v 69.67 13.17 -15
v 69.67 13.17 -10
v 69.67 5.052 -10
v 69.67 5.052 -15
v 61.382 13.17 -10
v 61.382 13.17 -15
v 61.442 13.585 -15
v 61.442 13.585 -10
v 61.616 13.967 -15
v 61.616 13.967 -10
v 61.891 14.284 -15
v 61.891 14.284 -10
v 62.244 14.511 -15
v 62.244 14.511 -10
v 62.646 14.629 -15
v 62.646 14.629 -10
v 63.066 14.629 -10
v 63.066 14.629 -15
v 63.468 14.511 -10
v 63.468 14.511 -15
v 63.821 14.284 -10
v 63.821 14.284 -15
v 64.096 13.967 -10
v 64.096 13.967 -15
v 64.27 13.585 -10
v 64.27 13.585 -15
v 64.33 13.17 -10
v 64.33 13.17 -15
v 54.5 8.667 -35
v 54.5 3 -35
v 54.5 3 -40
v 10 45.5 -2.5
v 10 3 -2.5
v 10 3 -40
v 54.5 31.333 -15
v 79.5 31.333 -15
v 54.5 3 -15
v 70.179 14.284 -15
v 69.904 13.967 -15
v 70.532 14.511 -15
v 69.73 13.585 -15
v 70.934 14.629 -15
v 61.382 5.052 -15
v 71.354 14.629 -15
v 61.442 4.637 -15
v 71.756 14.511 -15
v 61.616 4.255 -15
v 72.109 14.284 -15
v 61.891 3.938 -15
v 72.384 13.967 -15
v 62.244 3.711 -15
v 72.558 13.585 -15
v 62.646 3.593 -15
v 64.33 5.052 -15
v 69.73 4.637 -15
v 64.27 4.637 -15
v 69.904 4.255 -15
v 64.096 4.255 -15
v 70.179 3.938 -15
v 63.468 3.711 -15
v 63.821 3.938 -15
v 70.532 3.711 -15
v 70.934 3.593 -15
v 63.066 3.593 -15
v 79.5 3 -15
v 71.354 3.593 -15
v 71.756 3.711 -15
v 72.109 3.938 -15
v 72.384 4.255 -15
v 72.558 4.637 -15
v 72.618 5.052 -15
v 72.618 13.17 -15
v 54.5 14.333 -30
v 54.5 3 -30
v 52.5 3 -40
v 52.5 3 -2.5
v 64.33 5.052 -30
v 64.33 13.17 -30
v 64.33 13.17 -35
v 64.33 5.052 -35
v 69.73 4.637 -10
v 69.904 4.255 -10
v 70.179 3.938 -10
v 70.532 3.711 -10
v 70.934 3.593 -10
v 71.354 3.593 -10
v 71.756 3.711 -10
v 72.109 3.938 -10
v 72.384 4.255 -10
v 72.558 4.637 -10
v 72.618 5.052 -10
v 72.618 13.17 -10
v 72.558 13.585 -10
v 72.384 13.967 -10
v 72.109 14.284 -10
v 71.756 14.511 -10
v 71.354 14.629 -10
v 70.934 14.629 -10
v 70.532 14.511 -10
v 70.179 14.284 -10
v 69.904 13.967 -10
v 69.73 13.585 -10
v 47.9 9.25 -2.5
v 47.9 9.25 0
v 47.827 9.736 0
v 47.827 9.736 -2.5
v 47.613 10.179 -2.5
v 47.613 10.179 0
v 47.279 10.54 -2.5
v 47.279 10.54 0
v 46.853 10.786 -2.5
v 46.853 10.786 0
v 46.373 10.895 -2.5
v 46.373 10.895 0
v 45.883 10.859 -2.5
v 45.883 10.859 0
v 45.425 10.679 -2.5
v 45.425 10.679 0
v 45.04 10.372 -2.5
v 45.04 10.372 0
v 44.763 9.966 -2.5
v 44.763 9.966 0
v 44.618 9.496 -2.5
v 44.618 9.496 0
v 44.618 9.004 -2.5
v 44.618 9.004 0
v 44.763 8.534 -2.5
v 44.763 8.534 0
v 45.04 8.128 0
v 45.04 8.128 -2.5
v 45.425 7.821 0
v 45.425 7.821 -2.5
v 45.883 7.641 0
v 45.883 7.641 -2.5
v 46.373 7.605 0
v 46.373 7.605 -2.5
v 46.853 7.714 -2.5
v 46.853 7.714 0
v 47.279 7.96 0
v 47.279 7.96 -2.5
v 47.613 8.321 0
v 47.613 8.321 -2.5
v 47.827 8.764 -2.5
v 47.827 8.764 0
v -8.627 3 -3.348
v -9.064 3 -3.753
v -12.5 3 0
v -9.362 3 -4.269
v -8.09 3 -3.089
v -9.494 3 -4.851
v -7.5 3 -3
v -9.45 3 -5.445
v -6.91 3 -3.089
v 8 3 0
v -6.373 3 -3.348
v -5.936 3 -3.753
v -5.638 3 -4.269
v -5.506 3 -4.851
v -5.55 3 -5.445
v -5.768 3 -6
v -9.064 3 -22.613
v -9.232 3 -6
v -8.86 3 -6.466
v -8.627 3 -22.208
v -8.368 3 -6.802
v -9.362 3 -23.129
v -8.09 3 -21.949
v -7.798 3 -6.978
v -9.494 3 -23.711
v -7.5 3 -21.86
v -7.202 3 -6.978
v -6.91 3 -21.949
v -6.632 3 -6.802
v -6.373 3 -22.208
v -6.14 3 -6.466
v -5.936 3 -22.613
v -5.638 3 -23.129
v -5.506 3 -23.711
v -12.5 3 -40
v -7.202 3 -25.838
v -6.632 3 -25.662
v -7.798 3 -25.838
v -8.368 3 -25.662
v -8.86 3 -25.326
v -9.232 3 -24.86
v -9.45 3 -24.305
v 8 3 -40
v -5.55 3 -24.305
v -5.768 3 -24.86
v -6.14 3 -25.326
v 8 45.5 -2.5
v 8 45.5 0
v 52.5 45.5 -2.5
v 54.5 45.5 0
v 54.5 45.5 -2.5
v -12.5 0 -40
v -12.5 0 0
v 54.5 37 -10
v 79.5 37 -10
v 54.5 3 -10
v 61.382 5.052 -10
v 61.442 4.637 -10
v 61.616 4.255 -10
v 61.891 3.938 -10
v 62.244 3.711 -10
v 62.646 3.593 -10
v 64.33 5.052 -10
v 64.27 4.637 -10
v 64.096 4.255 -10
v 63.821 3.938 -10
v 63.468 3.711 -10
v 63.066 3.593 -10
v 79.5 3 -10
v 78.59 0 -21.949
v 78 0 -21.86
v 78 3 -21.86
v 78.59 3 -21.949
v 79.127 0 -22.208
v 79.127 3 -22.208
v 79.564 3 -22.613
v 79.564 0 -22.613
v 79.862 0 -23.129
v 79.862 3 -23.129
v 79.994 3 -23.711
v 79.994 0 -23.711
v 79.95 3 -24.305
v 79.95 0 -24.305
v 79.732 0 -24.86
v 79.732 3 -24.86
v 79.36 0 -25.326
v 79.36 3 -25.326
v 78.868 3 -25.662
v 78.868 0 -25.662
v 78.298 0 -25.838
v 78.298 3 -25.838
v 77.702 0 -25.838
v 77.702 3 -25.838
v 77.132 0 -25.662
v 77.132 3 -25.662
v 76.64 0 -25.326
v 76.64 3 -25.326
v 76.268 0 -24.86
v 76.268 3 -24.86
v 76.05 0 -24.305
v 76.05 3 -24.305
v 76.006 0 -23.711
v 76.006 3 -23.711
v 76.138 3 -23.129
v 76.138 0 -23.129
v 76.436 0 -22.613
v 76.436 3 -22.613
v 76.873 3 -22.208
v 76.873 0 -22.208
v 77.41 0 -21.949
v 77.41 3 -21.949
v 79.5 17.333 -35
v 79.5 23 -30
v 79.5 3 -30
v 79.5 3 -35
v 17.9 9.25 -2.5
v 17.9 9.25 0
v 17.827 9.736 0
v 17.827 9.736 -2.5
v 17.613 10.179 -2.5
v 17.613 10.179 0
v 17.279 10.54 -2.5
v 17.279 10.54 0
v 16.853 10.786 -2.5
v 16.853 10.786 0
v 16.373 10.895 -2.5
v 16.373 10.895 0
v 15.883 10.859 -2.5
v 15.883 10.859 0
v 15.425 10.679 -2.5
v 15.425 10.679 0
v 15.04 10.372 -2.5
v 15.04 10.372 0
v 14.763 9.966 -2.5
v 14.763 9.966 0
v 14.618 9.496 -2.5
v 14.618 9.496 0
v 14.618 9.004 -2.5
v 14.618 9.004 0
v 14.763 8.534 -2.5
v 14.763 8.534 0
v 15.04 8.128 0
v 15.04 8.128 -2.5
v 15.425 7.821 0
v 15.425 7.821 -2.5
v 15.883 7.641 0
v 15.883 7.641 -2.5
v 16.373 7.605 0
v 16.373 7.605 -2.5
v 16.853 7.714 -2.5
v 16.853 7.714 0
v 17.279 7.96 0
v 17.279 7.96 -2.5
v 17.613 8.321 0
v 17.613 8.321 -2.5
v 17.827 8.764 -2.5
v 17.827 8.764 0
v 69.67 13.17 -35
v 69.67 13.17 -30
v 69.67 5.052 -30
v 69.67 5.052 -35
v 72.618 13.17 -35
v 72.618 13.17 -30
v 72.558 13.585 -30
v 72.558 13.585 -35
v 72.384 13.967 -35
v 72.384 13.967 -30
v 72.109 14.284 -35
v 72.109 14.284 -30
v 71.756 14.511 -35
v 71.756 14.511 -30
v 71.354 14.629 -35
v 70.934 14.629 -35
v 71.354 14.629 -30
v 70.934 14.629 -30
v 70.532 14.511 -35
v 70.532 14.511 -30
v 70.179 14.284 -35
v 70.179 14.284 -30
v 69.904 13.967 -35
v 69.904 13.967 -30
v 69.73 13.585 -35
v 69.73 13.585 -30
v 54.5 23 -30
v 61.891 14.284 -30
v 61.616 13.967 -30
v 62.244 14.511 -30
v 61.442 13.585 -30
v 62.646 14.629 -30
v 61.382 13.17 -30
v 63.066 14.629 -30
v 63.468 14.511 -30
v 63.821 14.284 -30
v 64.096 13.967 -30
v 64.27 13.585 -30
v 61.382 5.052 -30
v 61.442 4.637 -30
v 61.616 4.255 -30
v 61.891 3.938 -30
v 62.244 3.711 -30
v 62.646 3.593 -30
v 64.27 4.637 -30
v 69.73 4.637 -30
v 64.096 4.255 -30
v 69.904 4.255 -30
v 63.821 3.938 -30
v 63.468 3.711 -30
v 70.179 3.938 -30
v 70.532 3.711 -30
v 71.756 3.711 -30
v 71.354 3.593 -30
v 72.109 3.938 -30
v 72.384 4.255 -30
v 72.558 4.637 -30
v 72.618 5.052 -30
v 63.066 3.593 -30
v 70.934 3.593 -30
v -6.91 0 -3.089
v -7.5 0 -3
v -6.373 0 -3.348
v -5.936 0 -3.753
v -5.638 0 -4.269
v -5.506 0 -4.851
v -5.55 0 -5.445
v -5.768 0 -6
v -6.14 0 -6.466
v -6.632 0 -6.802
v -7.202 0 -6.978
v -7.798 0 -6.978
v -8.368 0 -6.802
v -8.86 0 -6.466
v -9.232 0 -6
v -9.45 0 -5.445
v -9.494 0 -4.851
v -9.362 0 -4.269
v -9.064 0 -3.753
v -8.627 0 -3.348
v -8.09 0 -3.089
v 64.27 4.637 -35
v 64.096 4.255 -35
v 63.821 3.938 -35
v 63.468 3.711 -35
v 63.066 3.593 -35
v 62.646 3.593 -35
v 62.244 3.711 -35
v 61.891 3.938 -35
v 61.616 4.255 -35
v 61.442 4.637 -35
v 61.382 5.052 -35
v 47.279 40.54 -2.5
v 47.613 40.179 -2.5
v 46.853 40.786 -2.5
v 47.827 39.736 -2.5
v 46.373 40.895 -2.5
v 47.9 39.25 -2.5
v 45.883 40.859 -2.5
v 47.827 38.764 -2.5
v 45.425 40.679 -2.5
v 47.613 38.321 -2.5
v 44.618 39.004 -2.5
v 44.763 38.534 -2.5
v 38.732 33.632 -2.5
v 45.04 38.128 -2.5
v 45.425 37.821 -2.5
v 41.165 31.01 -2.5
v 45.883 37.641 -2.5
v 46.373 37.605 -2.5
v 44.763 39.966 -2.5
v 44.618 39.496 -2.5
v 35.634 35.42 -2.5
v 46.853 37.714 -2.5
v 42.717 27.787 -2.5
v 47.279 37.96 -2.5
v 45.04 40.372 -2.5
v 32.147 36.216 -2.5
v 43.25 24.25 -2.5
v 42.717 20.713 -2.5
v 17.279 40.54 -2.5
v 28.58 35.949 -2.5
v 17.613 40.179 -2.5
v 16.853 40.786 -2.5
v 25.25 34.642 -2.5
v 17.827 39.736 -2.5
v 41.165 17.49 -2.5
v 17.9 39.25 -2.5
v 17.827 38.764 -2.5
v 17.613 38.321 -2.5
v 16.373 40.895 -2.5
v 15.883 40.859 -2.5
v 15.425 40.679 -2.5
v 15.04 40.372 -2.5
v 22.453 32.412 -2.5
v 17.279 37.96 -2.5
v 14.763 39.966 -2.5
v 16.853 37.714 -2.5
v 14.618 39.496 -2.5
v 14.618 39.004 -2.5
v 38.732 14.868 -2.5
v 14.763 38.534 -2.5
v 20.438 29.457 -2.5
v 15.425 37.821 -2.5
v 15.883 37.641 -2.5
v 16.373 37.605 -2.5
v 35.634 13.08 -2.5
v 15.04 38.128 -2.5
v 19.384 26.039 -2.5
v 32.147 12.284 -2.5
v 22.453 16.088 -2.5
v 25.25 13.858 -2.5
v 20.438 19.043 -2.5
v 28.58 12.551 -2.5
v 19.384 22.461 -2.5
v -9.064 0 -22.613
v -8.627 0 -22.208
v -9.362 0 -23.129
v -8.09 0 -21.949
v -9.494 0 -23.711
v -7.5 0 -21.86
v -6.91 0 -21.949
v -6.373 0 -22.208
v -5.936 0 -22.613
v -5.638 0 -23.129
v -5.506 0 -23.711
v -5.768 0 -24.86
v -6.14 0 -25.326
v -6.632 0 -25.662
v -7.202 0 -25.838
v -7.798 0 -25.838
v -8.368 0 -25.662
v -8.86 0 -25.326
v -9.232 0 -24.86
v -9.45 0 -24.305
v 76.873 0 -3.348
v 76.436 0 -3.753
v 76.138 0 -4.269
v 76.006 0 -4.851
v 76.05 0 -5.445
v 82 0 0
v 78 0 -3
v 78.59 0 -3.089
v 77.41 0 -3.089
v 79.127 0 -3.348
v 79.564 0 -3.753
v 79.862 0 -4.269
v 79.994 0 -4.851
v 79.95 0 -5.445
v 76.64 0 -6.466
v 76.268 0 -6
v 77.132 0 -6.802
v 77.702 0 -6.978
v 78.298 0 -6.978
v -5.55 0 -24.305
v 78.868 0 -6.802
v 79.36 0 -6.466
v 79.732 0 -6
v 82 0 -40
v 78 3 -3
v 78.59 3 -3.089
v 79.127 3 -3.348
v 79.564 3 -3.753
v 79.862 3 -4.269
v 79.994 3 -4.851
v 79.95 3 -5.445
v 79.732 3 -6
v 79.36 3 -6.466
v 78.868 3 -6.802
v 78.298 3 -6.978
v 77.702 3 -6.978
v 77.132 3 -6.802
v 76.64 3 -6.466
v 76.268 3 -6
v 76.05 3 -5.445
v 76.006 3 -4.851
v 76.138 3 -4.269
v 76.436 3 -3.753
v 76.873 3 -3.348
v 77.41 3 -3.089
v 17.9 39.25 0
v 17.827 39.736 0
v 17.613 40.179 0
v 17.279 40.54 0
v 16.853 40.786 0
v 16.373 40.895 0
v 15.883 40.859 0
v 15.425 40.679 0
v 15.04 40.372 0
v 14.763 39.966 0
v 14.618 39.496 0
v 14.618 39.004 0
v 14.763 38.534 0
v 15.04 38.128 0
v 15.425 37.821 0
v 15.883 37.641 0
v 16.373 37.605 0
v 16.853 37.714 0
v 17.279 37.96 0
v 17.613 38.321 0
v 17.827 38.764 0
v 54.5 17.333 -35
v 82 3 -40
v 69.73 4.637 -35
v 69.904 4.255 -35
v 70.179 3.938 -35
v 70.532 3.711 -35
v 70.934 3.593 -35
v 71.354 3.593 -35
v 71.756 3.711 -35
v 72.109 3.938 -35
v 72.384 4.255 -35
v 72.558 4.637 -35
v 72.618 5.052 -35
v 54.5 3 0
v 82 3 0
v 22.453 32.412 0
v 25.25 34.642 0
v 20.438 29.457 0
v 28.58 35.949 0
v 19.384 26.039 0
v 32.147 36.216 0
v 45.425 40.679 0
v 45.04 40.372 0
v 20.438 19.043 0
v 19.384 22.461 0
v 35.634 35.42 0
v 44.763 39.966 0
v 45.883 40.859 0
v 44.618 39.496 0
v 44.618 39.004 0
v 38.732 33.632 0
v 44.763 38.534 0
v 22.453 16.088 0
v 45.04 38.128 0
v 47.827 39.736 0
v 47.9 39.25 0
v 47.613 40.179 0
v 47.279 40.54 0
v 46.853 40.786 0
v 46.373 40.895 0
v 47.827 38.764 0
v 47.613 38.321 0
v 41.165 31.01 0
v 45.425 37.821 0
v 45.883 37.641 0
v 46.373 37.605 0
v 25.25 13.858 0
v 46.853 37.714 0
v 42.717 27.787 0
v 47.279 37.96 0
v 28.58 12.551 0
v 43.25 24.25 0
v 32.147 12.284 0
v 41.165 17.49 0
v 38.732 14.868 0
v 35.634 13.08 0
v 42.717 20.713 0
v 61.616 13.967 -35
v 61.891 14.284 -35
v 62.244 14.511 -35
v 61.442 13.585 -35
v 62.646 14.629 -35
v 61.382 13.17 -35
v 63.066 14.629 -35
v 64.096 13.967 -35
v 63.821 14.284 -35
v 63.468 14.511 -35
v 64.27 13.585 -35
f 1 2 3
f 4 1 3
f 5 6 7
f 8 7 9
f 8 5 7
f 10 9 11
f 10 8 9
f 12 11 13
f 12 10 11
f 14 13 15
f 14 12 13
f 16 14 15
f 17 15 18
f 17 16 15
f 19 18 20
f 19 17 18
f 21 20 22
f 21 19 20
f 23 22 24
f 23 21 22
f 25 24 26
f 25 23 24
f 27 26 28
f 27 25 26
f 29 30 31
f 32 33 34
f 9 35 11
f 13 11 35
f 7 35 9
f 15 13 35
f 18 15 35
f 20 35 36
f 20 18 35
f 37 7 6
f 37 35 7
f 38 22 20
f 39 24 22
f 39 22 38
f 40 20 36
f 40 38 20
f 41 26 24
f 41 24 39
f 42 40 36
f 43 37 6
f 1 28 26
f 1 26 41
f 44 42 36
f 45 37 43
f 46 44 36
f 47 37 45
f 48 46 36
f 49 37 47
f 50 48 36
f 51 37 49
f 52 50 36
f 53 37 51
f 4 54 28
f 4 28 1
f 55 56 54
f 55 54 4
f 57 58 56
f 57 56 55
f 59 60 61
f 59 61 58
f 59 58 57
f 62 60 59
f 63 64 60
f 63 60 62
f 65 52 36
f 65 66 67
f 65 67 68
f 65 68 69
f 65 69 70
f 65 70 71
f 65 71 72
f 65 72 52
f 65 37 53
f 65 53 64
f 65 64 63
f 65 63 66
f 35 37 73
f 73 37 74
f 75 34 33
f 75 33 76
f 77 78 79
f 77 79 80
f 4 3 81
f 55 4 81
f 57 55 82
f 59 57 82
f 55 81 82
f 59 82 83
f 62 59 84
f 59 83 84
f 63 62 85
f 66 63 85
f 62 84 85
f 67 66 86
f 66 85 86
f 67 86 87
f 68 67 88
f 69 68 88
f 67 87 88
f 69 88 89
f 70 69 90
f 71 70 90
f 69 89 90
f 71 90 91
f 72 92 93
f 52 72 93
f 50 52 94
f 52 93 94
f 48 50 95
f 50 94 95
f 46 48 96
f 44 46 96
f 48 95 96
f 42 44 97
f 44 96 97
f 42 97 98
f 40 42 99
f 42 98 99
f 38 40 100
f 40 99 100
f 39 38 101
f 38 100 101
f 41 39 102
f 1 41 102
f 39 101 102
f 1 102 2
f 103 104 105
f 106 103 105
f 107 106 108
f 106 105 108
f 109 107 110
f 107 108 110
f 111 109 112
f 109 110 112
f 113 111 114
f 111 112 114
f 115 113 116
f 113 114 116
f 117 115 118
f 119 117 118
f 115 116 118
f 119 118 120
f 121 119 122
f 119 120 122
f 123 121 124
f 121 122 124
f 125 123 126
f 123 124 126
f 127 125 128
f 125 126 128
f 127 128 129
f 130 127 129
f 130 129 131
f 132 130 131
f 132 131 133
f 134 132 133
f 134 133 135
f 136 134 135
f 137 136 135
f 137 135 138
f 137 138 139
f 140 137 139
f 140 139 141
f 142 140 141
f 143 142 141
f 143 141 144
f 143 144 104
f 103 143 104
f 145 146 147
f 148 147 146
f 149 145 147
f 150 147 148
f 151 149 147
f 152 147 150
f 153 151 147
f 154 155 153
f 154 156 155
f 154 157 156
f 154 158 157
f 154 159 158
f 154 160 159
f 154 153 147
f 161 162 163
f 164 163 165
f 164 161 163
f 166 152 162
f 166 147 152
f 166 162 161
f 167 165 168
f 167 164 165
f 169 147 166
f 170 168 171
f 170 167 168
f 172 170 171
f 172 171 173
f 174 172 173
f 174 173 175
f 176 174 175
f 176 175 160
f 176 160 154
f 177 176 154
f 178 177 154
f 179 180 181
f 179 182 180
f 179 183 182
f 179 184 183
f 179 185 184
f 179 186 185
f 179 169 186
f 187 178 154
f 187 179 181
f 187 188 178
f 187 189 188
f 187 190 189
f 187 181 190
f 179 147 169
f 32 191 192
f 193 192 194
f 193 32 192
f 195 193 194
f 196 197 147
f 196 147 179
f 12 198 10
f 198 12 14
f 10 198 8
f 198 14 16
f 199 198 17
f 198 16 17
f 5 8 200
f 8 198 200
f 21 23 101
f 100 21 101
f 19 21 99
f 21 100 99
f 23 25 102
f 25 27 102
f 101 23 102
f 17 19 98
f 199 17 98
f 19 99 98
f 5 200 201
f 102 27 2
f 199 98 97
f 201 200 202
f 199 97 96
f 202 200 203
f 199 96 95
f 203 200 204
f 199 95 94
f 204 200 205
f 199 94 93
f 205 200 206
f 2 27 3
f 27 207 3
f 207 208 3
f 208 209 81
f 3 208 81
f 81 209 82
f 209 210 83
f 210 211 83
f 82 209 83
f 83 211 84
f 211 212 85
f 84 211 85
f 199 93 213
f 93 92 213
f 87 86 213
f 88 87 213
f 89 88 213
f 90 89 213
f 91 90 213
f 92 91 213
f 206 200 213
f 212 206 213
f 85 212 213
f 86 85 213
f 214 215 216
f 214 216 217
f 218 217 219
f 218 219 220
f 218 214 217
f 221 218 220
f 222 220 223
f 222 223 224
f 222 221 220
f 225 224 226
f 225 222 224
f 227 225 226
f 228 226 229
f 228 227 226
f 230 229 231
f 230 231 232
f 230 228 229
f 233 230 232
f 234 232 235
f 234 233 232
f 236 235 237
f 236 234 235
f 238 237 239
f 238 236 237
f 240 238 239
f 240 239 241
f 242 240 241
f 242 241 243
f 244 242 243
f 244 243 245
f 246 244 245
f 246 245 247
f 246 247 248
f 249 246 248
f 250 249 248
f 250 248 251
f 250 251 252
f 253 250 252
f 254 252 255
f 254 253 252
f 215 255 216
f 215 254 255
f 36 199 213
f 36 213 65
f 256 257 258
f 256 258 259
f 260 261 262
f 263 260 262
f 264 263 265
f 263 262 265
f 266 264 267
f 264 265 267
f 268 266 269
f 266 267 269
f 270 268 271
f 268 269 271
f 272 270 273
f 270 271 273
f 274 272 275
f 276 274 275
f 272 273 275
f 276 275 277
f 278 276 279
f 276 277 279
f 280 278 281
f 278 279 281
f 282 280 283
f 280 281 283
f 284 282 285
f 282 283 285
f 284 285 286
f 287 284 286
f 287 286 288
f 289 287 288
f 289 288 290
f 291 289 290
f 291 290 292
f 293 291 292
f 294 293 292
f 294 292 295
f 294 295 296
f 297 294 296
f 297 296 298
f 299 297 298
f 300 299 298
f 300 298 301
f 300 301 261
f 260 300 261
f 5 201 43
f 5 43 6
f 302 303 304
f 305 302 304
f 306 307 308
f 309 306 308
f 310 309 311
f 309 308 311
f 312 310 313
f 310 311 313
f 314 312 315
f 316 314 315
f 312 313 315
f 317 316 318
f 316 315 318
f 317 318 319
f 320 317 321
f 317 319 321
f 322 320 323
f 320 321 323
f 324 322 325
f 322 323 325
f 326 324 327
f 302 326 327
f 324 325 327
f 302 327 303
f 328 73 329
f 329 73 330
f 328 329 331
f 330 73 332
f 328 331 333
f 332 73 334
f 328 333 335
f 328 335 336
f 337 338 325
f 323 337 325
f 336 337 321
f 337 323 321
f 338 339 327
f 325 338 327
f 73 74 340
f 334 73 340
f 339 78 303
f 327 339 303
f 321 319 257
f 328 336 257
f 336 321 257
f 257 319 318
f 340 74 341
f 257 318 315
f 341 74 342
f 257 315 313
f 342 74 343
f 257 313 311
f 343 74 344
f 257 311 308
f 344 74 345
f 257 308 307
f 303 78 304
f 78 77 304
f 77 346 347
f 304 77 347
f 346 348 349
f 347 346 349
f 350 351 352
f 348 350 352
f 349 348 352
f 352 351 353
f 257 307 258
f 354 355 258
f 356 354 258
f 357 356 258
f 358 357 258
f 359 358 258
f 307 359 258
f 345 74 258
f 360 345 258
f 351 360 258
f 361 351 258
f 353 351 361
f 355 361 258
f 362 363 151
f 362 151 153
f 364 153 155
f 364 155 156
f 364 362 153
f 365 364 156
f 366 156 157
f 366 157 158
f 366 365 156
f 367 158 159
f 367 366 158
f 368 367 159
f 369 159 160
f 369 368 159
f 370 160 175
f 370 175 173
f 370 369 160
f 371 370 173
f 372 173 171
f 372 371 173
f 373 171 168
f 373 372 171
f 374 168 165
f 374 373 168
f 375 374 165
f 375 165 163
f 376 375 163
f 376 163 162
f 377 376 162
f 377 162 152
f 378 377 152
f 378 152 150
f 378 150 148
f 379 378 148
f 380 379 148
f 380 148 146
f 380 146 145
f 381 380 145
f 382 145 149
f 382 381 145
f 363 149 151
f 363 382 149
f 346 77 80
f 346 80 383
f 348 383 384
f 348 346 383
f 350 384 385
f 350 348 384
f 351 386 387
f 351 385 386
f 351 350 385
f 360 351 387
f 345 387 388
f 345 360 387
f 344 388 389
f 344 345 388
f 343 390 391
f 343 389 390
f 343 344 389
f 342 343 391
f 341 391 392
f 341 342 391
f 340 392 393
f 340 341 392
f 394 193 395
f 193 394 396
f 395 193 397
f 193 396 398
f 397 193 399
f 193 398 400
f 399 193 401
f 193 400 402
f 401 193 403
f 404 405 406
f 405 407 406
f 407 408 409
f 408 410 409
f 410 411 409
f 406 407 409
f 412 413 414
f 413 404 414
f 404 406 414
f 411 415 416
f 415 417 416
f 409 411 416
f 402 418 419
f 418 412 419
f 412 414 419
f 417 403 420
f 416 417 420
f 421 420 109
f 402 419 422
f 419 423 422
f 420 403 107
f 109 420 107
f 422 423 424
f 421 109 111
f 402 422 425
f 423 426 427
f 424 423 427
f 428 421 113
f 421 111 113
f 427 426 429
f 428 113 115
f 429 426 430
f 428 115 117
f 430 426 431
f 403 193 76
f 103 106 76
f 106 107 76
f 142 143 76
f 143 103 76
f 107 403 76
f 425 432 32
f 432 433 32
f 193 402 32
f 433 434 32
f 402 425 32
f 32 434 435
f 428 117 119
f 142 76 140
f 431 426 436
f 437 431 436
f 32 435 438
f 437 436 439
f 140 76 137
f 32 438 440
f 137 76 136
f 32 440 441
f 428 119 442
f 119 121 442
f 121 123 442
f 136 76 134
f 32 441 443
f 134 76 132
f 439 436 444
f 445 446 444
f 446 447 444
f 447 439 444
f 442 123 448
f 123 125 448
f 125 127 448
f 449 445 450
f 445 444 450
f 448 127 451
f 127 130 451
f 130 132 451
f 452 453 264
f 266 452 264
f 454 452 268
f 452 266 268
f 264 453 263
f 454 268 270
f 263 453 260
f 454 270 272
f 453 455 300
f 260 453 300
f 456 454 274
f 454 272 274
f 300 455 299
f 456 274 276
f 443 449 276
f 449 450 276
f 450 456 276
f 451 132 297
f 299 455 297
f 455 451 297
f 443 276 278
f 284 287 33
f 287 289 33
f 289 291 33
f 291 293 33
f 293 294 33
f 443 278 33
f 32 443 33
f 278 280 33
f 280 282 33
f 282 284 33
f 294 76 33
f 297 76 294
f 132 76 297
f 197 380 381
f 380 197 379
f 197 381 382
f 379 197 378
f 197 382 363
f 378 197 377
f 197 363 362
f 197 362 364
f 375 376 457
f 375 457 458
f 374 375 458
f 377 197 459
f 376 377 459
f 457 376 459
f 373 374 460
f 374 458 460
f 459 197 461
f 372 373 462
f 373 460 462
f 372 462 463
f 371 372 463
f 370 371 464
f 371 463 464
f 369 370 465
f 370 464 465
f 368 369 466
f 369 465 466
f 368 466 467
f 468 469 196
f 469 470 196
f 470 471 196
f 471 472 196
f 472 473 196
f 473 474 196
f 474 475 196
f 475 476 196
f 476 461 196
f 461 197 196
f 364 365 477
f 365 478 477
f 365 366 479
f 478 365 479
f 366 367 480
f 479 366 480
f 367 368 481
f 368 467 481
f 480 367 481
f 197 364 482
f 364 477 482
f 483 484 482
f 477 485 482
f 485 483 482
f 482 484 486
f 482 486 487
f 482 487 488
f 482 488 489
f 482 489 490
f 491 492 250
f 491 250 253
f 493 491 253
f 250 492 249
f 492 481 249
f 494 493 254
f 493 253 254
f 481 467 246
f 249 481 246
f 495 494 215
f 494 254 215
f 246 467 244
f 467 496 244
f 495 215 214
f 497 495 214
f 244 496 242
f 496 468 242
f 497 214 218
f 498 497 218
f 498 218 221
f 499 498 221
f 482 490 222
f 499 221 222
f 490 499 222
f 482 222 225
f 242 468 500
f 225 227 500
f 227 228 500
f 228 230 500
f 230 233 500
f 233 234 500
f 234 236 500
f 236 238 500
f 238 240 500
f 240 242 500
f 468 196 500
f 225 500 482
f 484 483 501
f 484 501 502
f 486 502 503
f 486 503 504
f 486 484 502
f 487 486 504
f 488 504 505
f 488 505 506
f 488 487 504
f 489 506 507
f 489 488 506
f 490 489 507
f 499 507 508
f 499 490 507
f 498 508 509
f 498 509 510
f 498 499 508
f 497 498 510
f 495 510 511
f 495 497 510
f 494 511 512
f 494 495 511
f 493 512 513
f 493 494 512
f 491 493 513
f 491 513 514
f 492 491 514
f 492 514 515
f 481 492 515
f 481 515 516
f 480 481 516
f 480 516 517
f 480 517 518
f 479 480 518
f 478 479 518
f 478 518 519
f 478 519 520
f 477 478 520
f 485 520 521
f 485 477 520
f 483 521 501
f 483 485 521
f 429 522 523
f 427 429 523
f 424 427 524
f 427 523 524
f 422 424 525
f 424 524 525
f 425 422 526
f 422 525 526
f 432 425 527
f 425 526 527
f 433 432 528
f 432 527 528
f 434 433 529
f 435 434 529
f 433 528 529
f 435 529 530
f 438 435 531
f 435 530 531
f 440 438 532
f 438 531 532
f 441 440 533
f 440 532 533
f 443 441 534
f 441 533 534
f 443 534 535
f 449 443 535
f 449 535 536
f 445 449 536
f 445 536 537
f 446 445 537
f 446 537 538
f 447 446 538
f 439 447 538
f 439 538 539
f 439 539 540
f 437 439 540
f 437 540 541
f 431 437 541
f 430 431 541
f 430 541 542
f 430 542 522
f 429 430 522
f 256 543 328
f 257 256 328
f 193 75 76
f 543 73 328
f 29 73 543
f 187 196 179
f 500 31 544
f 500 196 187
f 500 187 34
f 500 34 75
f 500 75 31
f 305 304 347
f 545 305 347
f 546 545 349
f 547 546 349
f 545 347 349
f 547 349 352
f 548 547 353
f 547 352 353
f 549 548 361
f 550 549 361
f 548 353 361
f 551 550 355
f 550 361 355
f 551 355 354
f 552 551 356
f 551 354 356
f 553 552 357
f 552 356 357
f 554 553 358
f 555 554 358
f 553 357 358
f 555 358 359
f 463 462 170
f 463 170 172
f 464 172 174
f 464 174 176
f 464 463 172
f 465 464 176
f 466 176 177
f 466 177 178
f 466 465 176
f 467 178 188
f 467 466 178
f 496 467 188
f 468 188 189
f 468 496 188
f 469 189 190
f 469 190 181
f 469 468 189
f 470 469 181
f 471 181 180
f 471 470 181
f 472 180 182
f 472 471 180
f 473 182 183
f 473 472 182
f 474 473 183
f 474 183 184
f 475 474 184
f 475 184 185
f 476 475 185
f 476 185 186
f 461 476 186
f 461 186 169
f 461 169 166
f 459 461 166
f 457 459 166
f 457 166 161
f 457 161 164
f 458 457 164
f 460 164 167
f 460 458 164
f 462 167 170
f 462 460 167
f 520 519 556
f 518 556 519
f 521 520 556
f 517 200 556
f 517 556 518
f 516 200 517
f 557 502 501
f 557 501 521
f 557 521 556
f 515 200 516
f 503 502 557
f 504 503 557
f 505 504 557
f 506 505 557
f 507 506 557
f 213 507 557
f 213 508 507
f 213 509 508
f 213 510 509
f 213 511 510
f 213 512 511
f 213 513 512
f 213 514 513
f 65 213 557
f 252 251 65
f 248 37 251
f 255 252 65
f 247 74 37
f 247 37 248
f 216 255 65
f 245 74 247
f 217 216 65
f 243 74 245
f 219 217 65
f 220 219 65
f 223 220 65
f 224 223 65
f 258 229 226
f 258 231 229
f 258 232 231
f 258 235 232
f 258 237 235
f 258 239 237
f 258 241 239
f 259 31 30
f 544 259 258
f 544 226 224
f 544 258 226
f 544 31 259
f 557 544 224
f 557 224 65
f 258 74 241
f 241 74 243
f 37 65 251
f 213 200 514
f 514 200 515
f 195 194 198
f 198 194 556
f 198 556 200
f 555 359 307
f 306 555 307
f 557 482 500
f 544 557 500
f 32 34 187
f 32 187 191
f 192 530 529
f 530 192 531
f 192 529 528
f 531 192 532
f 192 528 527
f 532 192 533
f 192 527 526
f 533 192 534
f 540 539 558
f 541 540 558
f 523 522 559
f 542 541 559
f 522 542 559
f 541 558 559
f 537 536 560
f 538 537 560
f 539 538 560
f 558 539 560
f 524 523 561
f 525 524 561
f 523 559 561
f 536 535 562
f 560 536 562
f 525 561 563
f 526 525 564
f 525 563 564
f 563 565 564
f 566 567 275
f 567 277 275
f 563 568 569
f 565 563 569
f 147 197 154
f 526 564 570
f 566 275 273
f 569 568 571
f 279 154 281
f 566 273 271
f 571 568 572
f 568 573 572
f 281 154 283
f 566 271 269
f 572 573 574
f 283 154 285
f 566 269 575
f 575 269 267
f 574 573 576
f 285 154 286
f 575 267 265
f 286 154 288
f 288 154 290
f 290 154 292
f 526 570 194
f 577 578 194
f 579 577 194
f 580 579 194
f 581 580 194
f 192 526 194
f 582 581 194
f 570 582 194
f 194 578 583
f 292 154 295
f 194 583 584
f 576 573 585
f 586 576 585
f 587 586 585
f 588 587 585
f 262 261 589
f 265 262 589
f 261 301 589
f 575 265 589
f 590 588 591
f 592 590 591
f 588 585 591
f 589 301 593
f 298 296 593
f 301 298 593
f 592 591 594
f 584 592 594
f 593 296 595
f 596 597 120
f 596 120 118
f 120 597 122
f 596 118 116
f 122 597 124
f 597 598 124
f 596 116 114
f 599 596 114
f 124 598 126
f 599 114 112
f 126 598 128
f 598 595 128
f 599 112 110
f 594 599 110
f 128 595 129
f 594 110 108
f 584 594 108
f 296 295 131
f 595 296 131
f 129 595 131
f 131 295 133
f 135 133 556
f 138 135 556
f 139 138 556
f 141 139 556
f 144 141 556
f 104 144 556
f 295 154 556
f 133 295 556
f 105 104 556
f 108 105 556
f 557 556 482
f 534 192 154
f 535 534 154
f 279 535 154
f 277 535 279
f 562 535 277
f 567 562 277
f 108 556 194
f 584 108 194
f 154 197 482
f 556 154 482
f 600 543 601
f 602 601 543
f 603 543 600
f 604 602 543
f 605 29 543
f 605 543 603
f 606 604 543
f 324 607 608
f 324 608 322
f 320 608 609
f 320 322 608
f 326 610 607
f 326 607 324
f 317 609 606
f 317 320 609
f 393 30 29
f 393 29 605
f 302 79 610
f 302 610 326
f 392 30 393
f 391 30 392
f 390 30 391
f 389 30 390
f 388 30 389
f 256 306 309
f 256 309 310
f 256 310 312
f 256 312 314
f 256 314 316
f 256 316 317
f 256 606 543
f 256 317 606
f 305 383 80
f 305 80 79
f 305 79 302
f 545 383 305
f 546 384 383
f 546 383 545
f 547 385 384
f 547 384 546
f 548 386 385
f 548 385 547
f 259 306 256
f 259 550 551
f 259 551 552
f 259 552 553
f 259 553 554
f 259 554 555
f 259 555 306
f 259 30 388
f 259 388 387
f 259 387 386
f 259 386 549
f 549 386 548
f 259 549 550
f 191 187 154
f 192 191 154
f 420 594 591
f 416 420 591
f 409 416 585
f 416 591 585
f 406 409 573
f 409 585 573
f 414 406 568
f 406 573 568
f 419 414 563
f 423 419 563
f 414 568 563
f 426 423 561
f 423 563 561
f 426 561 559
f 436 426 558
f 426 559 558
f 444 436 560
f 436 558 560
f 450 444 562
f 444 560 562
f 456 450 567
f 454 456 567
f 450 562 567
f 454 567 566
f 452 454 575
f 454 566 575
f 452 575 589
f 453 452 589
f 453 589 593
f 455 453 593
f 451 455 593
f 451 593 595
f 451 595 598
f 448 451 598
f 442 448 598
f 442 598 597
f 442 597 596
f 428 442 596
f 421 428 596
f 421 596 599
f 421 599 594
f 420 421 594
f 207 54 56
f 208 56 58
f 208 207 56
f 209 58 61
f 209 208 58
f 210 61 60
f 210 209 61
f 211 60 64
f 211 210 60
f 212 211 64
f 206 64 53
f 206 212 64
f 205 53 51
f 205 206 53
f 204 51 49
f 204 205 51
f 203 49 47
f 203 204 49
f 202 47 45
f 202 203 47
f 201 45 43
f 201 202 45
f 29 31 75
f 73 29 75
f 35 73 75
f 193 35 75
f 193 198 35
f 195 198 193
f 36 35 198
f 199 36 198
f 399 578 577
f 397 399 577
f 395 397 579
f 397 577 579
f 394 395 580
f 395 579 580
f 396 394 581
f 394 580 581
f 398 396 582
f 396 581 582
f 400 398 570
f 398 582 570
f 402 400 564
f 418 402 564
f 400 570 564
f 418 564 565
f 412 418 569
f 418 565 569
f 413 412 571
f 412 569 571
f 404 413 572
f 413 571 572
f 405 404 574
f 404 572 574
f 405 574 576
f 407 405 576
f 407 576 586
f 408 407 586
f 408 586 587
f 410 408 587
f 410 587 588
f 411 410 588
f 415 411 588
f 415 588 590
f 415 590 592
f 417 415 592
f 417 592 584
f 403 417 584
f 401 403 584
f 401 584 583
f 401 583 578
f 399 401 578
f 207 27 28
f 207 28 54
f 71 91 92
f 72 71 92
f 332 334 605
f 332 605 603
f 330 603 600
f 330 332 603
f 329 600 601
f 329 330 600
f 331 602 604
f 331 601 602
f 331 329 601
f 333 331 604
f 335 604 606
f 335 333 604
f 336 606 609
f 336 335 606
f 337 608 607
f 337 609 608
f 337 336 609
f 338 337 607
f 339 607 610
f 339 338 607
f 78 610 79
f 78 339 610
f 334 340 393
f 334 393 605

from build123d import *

# Parameters (mm, degrees)
SKETCH1_W           = 94.5
SKETCH1_H           = 40
SKETCH1_R           = 2
BOSS_EXTRUDE1_DEPTH = 3
BOSS_EXTRUDE2_DEPTH = 42.5
CUT_EXTRUDE1_DEPTH  = 88.459990853
SKETCH4_R           = 12
SKETCH4_R_2         = 1.65
CUT_EXTRUDE2_DEPTH  = 102.95219468
SKETCH7_W           = 25
SKETCH7_H           = 5
BOSS_EXTRUDE3_DEPTH = 20
BOSS_EXTRUDE4_REACH = 102.649
SKETCH7_3_W         = 25
SKETCH7_3_H         = 5
CUT_EXTRUDE3_DEPTH  = 99.459382488
CUT_EXTRUDE4_DEPTH  = 91.32856691


with BuildPart() as part:
    # Sketch1 → Boss-Extrude1 (new body)
    with BuildSketch(Plane(origin=(0, 0, 0), x_dir=(1, 0, 0), z_dir=(0, 1, 0))):
        with Locations((34.75, 20)):
            Rectangle(SKETCH1_W, SKETCH1_H)
        with Locations((78, 5)):
            Circle(SKETCH1_R, mode=Mode.SUBTRACT)
        with Locations((78, 23.86)):
            Circle(SKETCH1_R, mode=Mode.SUBTRACT)
        with Locations((-7.5, 23.86)):
            Circle(SKETCH1_R, mode=Mode.SUBTRACT)
        with Locations((-7.5, 5)):
            Circle(SKETCH1_R, mode=Mode.SUBTRACT)
    extrude(amount=BOSS_EXTRUDE1_DEPTH)

    # Sketch2 → Boss-Extrude2 (add)
    with BuildSketch(Plane(origin=(0, 3, 0), x_dir=(1, 0, 0), z_dir=(0, 1, 0))):
        Polygon((10, 2.5), (10, 40), (8, 40), (8, 0), (54.5, 0), (54.5, 40), (52.5, 40), (52.5, 2.5), align=None)
    extrude(amount=BOSS_EXTRUDE2_DEPTH)

    # Sketch3 → Cut-Extrude1 (cut, through all)
    with BuildSketch(Plane(origin=(54.5, 6, 0), x_dir=(0, 0, -1), z_dir=(-1, 0, 0))):
        Polygon((2.5, -39.5), (40, -39.5), (40, 3), align=None)
    extrude(amount=CUT_EXTRUDE1_DEPTH, mode=Mode.SUBTRACT)

    # Sketch4 → Cut-Extrude2 (cut, through all)
    with BuildSketch(Plane.XY):
        with Locations((31.25, 24.25)):
            Circle(SKETCH4_R)
        with Locations((16.25, 39.25)):
            Circle(SKETCH4_R_2)
        with Locations((16.25, 9.25)):
            Circle(SKETCH4_R_2)
        with Locations((46.25, 9.25)):
            Circle(SKETCH4_R_2)
        with Locations((46.25, 39.25)):
            Circle(SKETCH4_R_2)
    extrude(amount=-CUT_EXTRUDE2_DEPTH, mode=Mode.SUBTRACT)

    # Sketch7 → Boss-Extrude3 (add)
    with BuildSketch(Plane(origin=(0, 3, 0), x_dir=(1, 0, 0), z_dir=(0, 1, 0))):
        with Locations((67, 32.5)):
            Rectangle(SKETCH7_W, SKETCH7_H)
    extrude(amount=BOSS_EXTRUDE3_DEPTH)

    # Boss-Extrude4: up to this plane
    boss_extrude4_end = Plane(origin=(-12.5, 21.157587549, -23.978599222), z_dir=(0, -0.6616216370868465, 0.7498378553650924))
    # Sketch7<3> → Boss-Extrude4 (add, up to the surface)
    with BuildSketch(Plane(origin=(0, 3, 0), x_dir=(1, 0, 0), z_dir=(0, 1, 0)), mode=Mode.PRIVATE) as boss_extrude4_sk1:
        with Locations((67, 12.5)):
            Rectangle(SKETCH7_3_W, SKETCH7_3_H)
    boss_extrude4_tool1 = split(extrude(boss_extrude4_sk1.sketch, amount=BOSS_EXTRUDE4_REACH, mode=Mode.PRIVATE), bisect_by=boss_extrude4_end, keep=Keep.BOTH, mode=Mode.PRIVATE)
    add(boss_extrude4_tool1.solids().sort_by_distance((67, 3, -12.5))[0])

    # Sketch9 → Cut-Extrude3 (cut, through all)
    with BuildSketch(Plane.XY.offset(-10)):
        with BuildLine():
            Line((64.330095427, 5.052055091), (64.330095427, 13.170078856))
            ThreePointArc((64.330095427, 13.170078856), (62.856131757, 14.644042526), (61.382168087, 13.170078856))
            Line((61.382168087, 13.170078856), (61.382168087, 5.052055091))
            ThreePointArc((61.382168087, 5.052055091), (62.856131757, 3.578091421), (64.330095427, 5.052055091))
        make_face()
        with BuildLine():
            ThreePointArc((72.617831913, 13.170078856), (71.143868243, 14.644042526), (69.669904573, 13.170078856))
            Line((69.669904573, 13.170078856), (69.669904573, 5.052055091))
            ThreePointArc((69.669904573, 5.052055091), (71.143868243, 3.578091421), (72.617831913, 5.052055091))
            Line((72.617831913, 5.052055091), (72.617831913, 13.170078856))
        make_face()
    extrude(amount=-CUT_EXTRUDE3_DEPTH, mode=Mode.SUBTRACT)

    # Sketch11 → Cut-Extrude4 (cut, through all)
    with BuildSketch(Plane.ZY.offset(-54.5)):
        Polygon((-35, 17.332602518), (-30, 23), (-35, 23), align=None)
    extrude(amount=-CUT_EXTRUDE4_DEPTH, mode=Mode.SUBTRACT)


solid = part.part
